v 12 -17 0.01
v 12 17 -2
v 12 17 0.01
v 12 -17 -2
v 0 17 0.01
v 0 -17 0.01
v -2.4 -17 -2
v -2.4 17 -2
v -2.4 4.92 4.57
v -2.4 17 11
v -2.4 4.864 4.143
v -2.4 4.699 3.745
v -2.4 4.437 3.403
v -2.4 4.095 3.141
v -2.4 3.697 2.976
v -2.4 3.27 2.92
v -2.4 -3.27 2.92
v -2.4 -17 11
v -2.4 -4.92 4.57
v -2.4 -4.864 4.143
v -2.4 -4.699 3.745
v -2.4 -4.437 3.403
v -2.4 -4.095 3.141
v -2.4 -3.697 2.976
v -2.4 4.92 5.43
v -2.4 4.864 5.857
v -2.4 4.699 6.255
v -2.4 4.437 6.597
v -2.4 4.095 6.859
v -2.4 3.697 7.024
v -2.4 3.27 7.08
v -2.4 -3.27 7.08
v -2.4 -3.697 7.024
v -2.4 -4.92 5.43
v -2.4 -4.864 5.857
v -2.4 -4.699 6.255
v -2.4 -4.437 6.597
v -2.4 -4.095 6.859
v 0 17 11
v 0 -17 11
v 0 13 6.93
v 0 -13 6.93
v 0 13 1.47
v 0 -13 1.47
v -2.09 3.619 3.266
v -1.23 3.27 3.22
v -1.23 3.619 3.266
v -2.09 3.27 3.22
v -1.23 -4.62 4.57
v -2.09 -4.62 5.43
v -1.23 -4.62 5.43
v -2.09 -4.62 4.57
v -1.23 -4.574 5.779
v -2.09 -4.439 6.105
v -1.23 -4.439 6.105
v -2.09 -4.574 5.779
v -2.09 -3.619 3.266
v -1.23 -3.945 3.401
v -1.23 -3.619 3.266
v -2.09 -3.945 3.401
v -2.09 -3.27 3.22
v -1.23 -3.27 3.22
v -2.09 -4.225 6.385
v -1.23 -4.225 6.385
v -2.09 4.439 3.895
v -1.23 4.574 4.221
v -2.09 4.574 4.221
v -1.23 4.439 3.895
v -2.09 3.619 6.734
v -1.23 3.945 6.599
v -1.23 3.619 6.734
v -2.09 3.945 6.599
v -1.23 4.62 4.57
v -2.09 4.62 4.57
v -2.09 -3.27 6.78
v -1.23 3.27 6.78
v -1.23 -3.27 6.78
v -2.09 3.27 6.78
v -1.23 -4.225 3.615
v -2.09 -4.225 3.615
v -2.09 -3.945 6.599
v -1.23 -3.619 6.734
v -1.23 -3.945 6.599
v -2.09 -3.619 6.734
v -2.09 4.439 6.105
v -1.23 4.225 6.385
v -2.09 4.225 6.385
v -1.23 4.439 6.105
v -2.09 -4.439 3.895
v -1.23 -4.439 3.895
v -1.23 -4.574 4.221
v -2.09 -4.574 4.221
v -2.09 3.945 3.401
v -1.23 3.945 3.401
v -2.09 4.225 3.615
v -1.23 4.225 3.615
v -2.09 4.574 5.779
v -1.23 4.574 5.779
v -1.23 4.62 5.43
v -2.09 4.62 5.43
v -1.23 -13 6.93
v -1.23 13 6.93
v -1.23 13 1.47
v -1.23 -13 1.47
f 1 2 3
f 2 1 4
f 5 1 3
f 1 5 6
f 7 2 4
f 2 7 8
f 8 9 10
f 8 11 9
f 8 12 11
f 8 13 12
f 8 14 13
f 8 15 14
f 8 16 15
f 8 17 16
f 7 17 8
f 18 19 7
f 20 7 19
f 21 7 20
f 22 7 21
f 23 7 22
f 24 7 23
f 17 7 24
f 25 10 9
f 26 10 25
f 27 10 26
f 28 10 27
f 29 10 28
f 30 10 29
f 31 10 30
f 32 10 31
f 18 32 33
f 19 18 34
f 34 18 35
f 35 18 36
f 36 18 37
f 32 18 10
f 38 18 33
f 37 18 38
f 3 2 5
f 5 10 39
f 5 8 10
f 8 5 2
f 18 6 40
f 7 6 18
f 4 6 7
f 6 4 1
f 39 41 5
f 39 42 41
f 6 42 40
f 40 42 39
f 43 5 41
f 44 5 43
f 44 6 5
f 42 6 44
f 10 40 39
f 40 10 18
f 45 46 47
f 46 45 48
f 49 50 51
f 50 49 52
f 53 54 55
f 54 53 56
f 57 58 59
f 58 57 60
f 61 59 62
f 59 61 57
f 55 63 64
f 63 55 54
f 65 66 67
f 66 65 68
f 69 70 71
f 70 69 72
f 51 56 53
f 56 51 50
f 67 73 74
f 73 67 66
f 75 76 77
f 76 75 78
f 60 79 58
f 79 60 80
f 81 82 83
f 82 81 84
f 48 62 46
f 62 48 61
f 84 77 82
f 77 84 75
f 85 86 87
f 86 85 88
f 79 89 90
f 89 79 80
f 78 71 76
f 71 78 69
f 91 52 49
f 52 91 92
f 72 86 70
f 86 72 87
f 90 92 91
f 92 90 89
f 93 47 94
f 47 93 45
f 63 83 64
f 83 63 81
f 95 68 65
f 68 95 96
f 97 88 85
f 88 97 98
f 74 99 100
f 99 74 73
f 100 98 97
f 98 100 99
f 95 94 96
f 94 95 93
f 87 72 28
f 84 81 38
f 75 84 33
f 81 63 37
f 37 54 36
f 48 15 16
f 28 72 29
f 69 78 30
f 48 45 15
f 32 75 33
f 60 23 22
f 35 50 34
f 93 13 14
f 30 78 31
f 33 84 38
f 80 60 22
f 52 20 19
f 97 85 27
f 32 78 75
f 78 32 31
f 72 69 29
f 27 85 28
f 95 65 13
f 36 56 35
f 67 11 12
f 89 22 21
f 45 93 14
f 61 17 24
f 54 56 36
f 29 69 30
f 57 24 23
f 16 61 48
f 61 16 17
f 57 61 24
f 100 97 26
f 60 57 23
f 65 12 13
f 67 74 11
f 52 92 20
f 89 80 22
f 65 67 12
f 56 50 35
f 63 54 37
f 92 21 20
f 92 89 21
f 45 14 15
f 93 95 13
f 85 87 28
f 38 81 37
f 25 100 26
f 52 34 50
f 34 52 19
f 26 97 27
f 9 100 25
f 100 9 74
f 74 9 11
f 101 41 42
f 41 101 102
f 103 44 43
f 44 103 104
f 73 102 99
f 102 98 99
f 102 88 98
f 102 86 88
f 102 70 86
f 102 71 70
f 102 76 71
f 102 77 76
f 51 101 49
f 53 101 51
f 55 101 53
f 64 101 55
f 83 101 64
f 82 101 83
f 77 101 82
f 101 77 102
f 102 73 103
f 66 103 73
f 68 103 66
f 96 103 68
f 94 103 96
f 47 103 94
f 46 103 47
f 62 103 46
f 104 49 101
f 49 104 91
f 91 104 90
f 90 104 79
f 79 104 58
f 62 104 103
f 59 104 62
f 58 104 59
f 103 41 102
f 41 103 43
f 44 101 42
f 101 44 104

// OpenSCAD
// file: ../usb-c-port.scad
//-----------------------------------------------------------------------
// USB-C port through a wall, flush: the socket's metal shell sits in a
// close-fitting pocket in the wall, walled in on all four sides, its face
// level with the outside. The cable seats the way it does on a laptop.
//
// A board's socket only overhangs the board edge by a mm or so, less than
// the wall. So the board's end tucks into a shallow relief in the wall's
// inner face, the width of the board, leaving the wall round the socket
// thin enough for the face to reach the outside. When that would leave less
// than usbcMinWall (a socket that barely overhangs), the face sits back from
// the outside instead: usbcRecess() says how far.
//
// Modules, all in the same frame:
//   usbcGhost()     the socket and the board's end, for previews
//   usbcWallCut()   subtract from the wall: socket pocket and board relief
//
// Frame: origin on the floor top at the wall's inner face, under the socket's
// axis. +X into the box, Z up. The wall is X = -wall .. 0. The board is
// component side up, socket on top (top-mount, as on the FireBeetle, C3 Super
// Mini and S3 DevKitC). Units: mm.
//
// usbcBoardEdgeX() gives where the board's edge lands (negative: inside the
// wall), so a holder can put its posts or pocket to match.
//-----------------------------------------------------------------------

//-- The socket: USB-C receptacle shell (USB-IF 8.34 x 2.56 plug, receptacle shell ~8.94 x 3.26)
usbcShellW     = 8.94;
usbcShellH     = 3.26;    // CAL per board: measured 3.2 on the FireBeetle
usbcShellR     = 1.2;     // CAL: end radius. Full round would be 1.63; most shells are squarer
usbcShellDepth = 7.35;    // face to back

//-- The pocket
usbcClearance  = 0.15;    // CAL: per side, shell to pocket. Set by the fit piece
usbcMinWall    = 1.0;     // thinnest wall left round the socket
usbcReliefGap  = 0.3;     // board relief over the board, each side and above/below
usbcChamfer    = 0.3;     // lead-in on the outside edge

//-- How far the socket face sits back from the outside: 0 (flush) unless the socket
//-- overhangs the board edge by less than usbcMinWall
function usbcRecess(overhang, minWall = usbcMinWall) = max(0, minWall - overhang);
//-- X of the board's socket edge in this frame
function usbcBoardEdgeX(wall, overhang, recess) =
  -wall + (is_undef(recess) ? usbcRecess(overhang) : recess) + overhang;
//-- Z of the board's underside above the floor top
function usbcBoardZ(axisZ, pcb, shellH = usbcShellH) = axisZ - shellH/2 - pcb;

module usbcShell2D(grow = 0, w = usbcShellW, h = usbcShellH, r = usbcShellR)
{
  offset(r = r + grow, $fn = 24) square([w - 2*r, h - 2*r], center = true);
}

//-- axisZ: socket axis above the floor. boardW/pcb: the board, for the ghost and relief.
//-- shift: socket centre across the board's width from the board's centre line (+Y)
module usbcGhost(axisZ, wall, overhang, boardW, pcb = 1.6, recess, shift = 0, shellH = usbcShellH, shellW = usbcShellW)
{
  ex = usbcBoardEdgeX(wall, overhang, recess);
  %color("Silver") translate([ex - overhang, 0, axisZ]) rotate([0, 90, 0]) rotate([0, 0, 90])
    linear_extrude(usbcShellDepth) usbcShell2D(w = shellW, h = shellH);
  %color("DarkSlateGray") translate([ex, -boardW/2 - shift, usbcBoardZ(axisZ, pcb, shellH)]) cube([12, boardW, pcb]);
}

module usbcWallCut(axisZ, wall, overhang, boardW, pcb = 1.6, recess, shift = 0,
                   clearance = usbcClearance, shellH = usbcShellH, shellW = usbcShellW, aboveBoard)
{
  rc = is_undef(recess) ? usbcRecess(overhang) : recess;
  ex = usbcBoardEdgeX(wall, overhang, rc);
  bz = usbcBoardZ(axisZ, pcb, shellH);
  //-- what stands on the board near its edge: the socket, unless told taller
  up = is_undef(aboveBoard) ? shellH : aboveBoard;
  assert(ex - overhang + wall >= -0.01, "socket face would stand proud of the wall");
  assert(rc > 0 || overhang >= usbcMinWall - 0.01, "wall round the socket under usbcMinWall");
  //-- socket pocket, through the wall
  translate([-wall - 1, 0, axisZ]) rotate([0, 90, 0]) rotate([0, 0, 90])
    linear_extrude(wall + 2) usbcShell2D(clearance, w = shellW, h = shellH);
  //-- lead-in chamfer on the outside
  translate([-wall, 0, axisZ]) rotate([0, 90, 0]) rotate([0, 0, 90])
    hull()
    {
      translate([0, 0, -0.01]) linear_extrude(0.01) usbcShell2D(clearance + usbcChamfer, w = shellW, h = shellH);
      translate([0, 0, usbcChamfer]) linear_extrude(0.01) usbcShell2D(clearance, w = shellW, h = shellH);
    }
  //-- board relief in the inner face, when the board's edge lands inside the wall
  if (ex < 0)
    translate([ex - usbcReliefGap, -boardW/2 - shift - usbcReliefGap, bz - usbcReliefGap])
      cube([-ex + usbcReliefGap + 1, boardW + 2*usbcReliefGap, pcb + up + 2*usbcReliefGap]);
}
// main file
// One pocket in a piece of wall and floor, for the catalogue.
use <../usb-c-port.scad>

wall = 2.4; overhang = 1.47; boardW = 25.4; pcb = 1.6; axisZ = 5;
difference()
{
  union()
  {
    translate([-wall, -17, -2]) cube([wall + 12, 34, 2.01]);
    translate([-wall, -17, 0]) cube([wall, 34, axisZ + 6]);
  }
  usbcWallCut(axisZ, wall, overhang, boardW, pcb);
}
